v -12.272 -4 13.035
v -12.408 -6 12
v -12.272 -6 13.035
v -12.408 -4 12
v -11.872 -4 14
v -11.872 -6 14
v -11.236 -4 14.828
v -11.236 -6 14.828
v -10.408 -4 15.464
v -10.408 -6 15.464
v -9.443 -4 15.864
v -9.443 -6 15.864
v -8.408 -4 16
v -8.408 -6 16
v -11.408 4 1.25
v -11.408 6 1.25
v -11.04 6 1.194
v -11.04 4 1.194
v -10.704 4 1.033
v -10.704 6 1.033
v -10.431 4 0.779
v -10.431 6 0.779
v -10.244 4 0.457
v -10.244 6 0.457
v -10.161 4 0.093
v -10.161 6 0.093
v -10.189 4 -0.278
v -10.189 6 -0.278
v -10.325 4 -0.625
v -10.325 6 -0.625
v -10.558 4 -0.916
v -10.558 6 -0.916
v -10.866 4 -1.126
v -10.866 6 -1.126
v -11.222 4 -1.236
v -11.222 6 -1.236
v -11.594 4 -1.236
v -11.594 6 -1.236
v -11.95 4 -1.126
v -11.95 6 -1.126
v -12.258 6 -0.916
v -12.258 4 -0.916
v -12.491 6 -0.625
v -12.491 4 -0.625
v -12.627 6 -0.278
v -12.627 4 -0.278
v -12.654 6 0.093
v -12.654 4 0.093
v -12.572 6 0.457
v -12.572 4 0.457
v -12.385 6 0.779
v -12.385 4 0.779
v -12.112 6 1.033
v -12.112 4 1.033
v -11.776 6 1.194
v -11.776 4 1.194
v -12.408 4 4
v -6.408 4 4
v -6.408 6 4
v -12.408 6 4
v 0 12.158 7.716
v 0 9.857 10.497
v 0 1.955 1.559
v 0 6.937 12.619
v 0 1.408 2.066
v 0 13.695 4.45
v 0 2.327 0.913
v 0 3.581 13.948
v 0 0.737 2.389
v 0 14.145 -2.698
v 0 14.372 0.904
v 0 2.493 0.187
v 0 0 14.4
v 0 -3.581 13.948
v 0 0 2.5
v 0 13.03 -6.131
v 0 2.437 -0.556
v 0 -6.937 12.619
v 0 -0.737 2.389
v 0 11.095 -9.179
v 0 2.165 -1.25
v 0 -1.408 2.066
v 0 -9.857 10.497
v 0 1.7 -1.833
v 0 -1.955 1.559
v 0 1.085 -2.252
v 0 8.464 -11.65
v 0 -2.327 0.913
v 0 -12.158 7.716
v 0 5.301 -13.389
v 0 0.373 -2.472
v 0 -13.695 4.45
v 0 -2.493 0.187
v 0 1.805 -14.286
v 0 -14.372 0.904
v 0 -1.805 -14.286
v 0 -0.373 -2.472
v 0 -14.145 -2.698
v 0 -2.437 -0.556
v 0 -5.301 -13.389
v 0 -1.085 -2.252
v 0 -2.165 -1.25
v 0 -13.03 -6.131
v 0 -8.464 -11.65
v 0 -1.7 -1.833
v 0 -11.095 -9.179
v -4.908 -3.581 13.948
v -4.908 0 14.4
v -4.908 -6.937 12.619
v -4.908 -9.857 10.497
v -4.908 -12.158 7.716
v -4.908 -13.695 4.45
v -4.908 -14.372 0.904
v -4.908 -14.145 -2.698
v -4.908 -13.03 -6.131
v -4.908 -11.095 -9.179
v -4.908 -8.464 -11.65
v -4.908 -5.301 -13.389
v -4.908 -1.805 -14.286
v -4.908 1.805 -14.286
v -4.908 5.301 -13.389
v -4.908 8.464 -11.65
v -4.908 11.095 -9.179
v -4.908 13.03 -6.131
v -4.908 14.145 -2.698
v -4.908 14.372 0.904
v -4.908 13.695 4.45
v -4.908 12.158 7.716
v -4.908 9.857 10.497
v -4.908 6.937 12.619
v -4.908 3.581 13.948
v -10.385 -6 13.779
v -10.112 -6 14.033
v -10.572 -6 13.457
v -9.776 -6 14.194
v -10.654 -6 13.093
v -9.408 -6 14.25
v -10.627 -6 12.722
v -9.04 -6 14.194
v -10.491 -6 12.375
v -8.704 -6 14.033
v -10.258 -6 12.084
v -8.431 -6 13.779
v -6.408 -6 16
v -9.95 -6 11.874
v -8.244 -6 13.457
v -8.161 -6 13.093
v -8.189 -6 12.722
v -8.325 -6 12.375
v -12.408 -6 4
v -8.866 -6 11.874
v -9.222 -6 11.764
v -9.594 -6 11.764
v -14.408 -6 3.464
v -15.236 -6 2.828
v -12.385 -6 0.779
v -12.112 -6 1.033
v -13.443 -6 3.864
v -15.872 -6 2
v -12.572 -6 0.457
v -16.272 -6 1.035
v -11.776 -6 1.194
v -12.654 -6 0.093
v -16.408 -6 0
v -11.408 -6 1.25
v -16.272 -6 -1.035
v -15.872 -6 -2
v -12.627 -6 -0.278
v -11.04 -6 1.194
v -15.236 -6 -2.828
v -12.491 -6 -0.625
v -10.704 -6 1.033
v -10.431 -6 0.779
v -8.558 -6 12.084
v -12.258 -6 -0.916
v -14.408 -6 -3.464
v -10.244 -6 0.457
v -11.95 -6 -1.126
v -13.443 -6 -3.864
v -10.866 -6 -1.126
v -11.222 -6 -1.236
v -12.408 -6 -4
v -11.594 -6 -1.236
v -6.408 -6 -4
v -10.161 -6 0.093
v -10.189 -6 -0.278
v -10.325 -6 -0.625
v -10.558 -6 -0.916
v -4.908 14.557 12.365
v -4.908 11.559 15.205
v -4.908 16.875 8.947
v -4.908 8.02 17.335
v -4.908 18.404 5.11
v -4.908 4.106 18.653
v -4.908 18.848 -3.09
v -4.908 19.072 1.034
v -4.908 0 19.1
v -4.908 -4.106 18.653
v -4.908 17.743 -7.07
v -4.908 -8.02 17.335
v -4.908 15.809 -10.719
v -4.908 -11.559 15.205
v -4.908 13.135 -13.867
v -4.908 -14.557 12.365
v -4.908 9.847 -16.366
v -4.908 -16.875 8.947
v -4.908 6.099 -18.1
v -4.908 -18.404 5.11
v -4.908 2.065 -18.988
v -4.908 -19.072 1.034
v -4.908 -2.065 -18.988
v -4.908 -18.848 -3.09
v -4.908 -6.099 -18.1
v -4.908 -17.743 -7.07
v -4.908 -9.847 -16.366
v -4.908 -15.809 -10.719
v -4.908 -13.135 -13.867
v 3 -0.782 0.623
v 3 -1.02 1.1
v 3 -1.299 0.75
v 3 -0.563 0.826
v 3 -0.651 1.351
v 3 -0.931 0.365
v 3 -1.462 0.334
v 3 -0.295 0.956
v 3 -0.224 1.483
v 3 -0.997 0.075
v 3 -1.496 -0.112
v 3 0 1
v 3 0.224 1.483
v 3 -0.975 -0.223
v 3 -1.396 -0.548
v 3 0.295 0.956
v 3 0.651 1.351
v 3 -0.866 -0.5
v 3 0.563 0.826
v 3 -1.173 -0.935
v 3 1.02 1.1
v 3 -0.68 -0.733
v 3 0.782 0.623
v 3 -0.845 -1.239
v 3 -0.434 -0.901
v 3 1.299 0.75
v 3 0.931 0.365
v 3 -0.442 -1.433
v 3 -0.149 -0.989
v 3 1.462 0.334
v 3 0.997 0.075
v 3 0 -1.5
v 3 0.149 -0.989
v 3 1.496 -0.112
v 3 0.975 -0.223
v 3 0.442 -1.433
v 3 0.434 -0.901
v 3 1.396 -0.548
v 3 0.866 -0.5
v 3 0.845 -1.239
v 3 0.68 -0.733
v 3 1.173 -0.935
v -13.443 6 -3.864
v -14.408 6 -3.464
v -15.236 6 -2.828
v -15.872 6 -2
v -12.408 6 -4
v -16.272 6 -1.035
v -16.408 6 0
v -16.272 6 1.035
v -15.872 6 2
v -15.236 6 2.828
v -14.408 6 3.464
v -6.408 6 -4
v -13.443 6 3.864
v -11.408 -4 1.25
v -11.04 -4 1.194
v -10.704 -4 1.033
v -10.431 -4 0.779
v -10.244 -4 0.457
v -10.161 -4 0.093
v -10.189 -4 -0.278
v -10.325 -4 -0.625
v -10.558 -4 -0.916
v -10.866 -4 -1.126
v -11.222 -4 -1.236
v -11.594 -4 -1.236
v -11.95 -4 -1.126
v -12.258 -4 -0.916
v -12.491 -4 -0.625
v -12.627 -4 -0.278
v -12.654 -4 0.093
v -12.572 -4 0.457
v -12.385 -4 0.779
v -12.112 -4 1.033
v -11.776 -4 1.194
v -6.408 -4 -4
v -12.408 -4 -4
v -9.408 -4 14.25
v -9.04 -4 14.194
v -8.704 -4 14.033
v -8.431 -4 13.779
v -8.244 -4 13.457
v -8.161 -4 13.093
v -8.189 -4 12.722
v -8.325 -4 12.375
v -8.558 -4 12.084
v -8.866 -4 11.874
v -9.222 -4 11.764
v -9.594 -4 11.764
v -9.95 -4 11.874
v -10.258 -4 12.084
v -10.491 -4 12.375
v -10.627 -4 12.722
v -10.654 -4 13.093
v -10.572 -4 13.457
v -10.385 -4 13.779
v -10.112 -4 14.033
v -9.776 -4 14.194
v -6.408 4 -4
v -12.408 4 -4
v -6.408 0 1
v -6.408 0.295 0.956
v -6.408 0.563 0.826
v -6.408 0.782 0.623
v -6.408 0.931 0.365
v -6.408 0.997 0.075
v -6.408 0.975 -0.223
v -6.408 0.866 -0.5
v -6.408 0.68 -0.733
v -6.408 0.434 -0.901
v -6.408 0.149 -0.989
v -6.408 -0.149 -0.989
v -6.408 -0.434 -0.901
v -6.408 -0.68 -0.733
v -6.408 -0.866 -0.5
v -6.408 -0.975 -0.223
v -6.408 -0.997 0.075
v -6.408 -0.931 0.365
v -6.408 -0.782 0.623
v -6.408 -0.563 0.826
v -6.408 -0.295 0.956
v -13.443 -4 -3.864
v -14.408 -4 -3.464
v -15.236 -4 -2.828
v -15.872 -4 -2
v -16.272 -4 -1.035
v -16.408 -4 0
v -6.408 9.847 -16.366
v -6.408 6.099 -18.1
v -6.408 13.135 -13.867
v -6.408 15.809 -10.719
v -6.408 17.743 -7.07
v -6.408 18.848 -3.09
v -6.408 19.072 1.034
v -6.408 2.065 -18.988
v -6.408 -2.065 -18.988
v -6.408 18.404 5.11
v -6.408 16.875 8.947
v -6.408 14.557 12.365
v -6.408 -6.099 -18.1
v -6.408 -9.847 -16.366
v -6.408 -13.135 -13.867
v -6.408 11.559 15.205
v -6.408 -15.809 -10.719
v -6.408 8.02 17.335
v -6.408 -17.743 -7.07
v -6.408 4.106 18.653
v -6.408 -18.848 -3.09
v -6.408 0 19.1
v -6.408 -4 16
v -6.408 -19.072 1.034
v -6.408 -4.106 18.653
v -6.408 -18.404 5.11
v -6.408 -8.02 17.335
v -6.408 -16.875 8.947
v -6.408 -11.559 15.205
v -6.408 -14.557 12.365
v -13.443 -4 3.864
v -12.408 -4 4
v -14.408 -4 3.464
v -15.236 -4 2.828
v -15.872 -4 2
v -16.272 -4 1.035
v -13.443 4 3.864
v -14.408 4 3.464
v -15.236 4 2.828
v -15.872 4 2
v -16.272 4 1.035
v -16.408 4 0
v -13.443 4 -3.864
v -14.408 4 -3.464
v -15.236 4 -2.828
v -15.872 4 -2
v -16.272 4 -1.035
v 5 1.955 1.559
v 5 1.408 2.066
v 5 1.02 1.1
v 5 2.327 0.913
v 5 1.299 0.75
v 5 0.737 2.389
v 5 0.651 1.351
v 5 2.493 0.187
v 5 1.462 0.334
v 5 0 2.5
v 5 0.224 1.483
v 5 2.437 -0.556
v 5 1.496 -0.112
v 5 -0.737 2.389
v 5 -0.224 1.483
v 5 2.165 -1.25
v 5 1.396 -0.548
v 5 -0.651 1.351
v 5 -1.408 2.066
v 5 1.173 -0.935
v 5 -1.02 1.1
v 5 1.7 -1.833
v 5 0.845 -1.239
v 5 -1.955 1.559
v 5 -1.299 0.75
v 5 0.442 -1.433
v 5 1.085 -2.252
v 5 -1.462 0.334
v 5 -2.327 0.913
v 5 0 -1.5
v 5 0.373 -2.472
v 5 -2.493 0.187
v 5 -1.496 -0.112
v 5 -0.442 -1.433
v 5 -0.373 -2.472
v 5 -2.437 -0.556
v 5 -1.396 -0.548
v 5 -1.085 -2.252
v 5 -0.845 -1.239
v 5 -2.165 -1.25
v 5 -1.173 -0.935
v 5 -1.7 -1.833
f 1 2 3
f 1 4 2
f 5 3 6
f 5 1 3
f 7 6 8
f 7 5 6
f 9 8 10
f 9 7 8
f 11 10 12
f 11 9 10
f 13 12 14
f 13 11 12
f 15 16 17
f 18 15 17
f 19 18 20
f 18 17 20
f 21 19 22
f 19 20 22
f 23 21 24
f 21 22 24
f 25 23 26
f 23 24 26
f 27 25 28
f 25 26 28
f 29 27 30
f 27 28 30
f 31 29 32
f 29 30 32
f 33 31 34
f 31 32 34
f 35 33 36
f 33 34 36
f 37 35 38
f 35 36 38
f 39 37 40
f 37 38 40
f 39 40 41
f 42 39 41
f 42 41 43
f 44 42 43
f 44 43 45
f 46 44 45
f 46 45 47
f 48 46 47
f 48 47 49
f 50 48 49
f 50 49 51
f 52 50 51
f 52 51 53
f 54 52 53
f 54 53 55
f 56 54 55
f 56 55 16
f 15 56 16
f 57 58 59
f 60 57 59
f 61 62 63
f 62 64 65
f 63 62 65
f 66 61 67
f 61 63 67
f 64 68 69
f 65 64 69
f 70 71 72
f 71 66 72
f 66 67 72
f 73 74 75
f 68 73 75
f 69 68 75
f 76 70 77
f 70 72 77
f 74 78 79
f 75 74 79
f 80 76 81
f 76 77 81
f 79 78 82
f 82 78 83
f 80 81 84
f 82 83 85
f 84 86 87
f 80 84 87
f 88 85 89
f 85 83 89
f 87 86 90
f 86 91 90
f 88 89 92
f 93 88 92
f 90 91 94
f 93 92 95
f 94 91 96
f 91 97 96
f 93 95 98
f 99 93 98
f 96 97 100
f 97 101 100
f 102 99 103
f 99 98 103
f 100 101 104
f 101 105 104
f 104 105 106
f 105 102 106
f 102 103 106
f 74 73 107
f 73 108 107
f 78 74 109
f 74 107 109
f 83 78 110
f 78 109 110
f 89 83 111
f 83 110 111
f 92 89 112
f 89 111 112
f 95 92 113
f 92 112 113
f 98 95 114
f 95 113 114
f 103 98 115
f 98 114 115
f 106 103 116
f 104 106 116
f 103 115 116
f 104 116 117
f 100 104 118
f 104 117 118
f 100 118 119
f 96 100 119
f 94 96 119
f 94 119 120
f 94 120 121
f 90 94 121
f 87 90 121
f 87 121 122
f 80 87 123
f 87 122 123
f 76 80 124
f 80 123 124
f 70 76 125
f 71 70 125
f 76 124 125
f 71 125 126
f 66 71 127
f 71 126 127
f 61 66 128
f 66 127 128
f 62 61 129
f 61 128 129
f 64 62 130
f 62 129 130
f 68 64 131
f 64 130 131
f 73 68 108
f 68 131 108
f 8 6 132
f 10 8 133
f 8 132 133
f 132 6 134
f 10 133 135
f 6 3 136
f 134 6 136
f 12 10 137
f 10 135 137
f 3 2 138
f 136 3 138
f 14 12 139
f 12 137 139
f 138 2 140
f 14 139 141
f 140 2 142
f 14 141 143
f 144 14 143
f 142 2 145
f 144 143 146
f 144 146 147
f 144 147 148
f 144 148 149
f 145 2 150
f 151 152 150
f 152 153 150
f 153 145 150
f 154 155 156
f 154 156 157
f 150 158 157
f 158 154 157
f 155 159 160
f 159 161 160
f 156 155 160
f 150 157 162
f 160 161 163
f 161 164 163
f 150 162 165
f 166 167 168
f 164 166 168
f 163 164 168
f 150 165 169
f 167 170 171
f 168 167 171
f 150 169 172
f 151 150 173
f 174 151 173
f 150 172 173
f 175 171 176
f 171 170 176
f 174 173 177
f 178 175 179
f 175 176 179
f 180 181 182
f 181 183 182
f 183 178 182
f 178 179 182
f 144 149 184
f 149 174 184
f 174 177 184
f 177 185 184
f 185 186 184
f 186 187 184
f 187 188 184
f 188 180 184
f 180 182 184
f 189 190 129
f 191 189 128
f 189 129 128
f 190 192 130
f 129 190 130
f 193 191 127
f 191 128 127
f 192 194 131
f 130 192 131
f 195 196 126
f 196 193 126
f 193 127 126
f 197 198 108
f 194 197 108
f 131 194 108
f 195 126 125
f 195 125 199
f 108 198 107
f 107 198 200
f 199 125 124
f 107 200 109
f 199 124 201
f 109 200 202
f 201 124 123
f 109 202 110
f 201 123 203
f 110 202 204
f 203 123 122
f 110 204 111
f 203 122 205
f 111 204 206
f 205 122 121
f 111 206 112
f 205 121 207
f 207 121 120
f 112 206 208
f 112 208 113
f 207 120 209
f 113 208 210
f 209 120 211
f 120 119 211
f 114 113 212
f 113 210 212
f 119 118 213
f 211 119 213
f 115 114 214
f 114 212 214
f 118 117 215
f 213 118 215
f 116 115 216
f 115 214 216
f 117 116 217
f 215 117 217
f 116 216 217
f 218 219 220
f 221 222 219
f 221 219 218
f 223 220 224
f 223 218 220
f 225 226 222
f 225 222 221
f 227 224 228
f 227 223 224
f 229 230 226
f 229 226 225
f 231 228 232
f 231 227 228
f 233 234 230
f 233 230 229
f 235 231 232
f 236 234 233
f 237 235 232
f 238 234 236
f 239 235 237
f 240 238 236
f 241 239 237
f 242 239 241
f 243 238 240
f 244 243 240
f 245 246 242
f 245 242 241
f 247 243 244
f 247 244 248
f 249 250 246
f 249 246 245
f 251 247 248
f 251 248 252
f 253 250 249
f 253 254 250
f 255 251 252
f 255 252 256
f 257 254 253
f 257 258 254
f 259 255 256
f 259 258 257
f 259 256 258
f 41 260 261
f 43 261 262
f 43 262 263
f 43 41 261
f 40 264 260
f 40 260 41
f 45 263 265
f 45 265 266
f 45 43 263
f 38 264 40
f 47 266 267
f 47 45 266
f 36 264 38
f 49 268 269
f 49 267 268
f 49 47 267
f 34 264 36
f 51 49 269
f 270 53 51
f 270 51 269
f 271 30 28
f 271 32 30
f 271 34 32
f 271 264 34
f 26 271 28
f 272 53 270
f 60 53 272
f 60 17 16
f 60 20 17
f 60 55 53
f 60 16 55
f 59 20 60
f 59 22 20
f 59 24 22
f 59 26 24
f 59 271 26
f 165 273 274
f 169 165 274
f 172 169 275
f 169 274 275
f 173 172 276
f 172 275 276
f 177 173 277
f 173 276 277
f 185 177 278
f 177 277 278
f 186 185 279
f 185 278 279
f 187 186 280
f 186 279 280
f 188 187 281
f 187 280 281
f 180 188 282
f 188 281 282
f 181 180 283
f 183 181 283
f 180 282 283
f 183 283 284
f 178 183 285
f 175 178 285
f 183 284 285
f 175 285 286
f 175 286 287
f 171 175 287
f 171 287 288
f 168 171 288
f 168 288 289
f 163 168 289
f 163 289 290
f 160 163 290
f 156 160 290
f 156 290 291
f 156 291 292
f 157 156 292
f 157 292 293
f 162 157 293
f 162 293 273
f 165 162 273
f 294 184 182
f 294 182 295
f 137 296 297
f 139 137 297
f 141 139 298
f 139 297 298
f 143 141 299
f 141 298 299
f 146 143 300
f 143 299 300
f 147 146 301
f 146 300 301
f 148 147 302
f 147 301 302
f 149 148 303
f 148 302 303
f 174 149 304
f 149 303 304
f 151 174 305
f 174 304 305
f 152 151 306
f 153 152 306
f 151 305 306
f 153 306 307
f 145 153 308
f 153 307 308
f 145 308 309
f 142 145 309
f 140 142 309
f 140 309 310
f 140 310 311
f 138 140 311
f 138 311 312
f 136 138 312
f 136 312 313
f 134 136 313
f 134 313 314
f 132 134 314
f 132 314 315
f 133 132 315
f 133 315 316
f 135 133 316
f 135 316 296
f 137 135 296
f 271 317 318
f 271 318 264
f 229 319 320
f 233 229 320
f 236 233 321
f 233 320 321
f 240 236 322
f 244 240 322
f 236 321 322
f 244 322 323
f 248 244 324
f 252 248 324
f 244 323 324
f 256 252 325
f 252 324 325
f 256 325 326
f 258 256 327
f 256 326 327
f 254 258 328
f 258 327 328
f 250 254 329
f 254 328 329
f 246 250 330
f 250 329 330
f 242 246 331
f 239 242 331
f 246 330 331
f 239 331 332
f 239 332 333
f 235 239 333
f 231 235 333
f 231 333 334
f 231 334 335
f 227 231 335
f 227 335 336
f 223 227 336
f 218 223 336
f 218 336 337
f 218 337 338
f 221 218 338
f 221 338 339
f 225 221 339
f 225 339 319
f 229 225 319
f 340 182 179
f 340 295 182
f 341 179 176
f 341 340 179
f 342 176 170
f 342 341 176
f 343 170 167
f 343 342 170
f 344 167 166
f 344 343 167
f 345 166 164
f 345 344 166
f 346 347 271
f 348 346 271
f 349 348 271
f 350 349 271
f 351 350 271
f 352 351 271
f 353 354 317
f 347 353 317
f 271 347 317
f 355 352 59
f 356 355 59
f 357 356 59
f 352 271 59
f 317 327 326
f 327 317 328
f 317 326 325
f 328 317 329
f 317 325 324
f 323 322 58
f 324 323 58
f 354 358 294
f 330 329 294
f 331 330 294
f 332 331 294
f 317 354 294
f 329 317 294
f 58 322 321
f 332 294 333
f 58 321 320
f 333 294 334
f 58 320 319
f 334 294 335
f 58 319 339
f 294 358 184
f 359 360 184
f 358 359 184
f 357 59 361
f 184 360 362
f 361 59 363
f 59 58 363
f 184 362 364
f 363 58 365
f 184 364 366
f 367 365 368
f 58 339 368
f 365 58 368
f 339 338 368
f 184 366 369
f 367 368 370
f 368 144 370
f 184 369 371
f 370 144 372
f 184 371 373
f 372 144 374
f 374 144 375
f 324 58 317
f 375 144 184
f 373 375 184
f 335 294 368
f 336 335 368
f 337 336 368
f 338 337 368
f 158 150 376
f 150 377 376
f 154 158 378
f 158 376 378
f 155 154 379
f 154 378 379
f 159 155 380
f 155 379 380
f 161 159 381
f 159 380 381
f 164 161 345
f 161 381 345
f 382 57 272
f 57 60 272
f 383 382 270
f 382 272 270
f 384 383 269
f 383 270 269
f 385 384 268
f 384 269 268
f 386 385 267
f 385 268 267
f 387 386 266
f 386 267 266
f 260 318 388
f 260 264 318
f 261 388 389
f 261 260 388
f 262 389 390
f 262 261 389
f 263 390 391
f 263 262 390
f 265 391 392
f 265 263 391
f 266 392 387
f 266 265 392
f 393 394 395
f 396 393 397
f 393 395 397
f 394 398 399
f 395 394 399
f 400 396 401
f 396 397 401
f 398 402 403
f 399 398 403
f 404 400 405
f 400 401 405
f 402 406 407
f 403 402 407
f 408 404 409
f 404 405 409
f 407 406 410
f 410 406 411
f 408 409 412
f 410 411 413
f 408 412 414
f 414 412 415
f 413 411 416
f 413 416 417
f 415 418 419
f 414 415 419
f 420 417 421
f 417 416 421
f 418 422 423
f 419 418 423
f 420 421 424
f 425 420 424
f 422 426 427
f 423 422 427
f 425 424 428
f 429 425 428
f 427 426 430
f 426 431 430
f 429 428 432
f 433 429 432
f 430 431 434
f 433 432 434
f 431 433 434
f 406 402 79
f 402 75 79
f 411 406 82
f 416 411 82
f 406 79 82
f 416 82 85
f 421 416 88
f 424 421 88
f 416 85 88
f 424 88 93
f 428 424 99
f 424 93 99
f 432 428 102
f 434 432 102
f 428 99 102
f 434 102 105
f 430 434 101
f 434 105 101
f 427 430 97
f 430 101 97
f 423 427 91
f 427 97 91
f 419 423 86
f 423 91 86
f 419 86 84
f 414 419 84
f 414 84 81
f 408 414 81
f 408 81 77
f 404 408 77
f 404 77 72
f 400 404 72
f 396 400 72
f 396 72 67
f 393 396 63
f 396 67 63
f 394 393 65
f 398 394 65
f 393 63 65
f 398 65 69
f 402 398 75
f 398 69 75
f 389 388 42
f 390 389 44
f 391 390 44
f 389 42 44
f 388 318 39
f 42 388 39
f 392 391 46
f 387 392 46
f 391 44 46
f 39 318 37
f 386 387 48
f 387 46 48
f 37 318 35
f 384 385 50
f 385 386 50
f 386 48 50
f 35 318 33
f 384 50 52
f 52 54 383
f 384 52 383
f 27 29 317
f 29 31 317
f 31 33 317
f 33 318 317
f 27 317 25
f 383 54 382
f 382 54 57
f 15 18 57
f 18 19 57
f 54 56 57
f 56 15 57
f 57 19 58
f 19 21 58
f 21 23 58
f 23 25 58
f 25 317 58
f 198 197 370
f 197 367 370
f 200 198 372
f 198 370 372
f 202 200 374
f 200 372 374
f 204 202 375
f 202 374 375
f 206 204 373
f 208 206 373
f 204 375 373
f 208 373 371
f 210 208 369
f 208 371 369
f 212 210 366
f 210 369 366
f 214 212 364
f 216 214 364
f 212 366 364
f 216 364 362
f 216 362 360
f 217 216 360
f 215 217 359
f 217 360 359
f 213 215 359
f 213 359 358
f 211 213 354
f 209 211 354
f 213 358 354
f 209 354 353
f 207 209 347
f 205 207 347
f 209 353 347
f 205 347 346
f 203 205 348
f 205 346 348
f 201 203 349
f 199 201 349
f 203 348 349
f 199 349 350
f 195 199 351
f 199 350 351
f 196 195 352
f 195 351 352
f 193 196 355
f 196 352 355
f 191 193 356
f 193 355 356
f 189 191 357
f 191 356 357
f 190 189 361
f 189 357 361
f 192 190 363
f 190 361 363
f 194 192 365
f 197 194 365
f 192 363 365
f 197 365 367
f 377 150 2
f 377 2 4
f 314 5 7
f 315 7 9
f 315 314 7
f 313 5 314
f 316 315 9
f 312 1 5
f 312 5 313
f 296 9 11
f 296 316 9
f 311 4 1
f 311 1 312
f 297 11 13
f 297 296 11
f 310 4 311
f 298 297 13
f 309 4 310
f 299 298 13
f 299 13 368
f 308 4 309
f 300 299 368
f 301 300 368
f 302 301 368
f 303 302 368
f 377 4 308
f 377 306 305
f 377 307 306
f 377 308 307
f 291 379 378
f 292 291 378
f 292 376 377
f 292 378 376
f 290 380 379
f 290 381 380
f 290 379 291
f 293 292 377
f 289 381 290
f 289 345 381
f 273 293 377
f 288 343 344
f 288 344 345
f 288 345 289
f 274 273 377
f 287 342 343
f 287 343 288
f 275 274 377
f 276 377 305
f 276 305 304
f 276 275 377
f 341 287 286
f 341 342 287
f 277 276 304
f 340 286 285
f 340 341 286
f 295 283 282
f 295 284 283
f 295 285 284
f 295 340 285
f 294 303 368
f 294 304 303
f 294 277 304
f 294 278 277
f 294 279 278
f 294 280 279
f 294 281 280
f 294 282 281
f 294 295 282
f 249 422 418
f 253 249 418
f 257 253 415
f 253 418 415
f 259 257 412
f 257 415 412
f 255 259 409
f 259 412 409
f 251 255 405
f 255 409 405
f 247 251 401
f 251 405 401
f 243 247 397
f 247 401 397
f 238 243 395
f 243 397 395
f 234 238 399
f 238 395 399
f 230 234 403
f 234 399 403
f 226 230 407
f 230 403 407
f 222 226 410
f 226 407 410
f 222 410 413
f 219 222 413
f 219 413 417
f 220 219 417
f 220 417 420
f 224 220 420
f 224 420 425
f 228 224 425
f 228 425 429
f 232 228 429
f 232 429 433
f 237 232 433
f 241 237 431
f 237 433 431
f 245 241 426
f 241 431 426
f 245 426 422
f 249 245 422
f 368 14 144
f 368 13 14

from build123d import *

# Parameters (mm, degrees)
SKETCH2_R           = 1
CUT_EXTRUDE1_DEPTH  = 30.321700517
SKETCH3_R           = 1.5
CUT_EXTRUDE2_DEPTH  = 2
SKETCH4_W           = 8
SKETCH4_H           = 2
BOSS_EXTRUDE1_DEPTH = 10
SKETCH6_R           = 1.25
CUT_EXTRUDE4_DEPTH  = 20
FILLET1_R           = 4
SKETCH7_W           = 6
SKETCH7_H           = 2
BOSS_EXTRUDE2_DEPTH = 12
SKETCH8_R           = 1.25
CUT_EXTRUDE5_DEPTH  = 12
FILLET2_R           = 4


with BuildPart() as part:
    # Sketch1 → Revolve1 (revolve)
    with BuildSketch(Plane(origin=(0, 0, 0), x_dir=(1, 0, 0), z_dir=(0, 1, 0)), mode=Mode.PRIVATE) as revolve1_sk:
        Polygon((0, 2.5), (0, 14.4), (-4.907984975, 14.4), (-4.907984975, 19.1), (-6.407984975, 19.1), (-6.407984975, 0), (0, 0), (5, 0), (5, 2.5), align=None)
    revolve(revolve1_sk.sketch.rotate(Axis((-25.527114743, 0, 0), (1, 0, 0)), 180), axis=Axis((-25.527114743, 0, 0), (1, 0, 0)))

    # Sketch2 → Cut-Extrude1 (cut, through all)
    with BuildSketch(Plane.ZY.offset(6.407984975)):
        Circle(SKETCH2_R)
    extrude(amount=-CUT_EXTRUDE1_DEPTH, mode=Mode.SUBTRACT)

    # Sketch3 → Cut-Extrude2 (cut)
    with BuildSketch(Plane(origin=(5, 0, 0), x_dir=(0, 0, -1), z_dir=(1, 0, 0))):
        Circle(SKETCH3_R)
    extrude(amount=-CUT_EXTRUDE2_DEPTH, mode=Mode.SUBTRACT)

    # Sketch4 → Boss-Extrude1 (add)
    with BuildSketch(Plane.ZY.offset(6.407984975)):
        with Locations((0, 5)):
            Rectangle(SKETCH4_W, SKETCH4_H)
        with Locations((0, -5)):
            Rectangle(SKETCH4_W, SKETCH4_H)
    extrude(amount=BOSS_EXTRUDE1_DEPTH)

    # Sketch6 → Cut-Extrude4 (cut)
    with BuildSketch(Plane(origin=(0, 6, 0), x_dir=(1, 0, 0), z_dir=(0, 1, 0))):
        with Locations(Location((-11.407984975, 0, 0), (0, 0, 270))):
            Circle(SKETCH6_R)
    extrude(amount=-CUT_EXTRUDE4_DEPTH, mode=Mode.SUBTRACT)

    # Fillet1
    fillet1_edges = [part.edges().sort_by_distance(p)[0] for p in [
        (-16.407984975, -5, 4),
        (-16.407984975, -5, -4),
        (-16.407984975, 5, 4),
        (-16.407984975, 5, -4),
    ]]
    fillet(fillet1_edges, radius=FILLET1_R - 0.0001)  # a hair under: the kernel refuses the full size

    # Sketch7 → Boss-Extrude2 (add)
    with BuildSketch(Plane.XY.offset(4)):
        with Locations((-9.407984975, -5)):
            Rectangle(SKETCH7_W, SKETCH7_H)
    extrude(amount=BOSS_EXTRUDE2_DEPTH)

    # Sketch8 → Cut-Extrude5 (cut)
    with BuildSketch(Plane(origin=(0, -4, 0), x_dir=(1, 0, 0), z_dir=(0, 1, 0))):
        with Locations(Location((-9.407984975, -13, 0), (0, 0, 270))):
            Circle(SKETCH8_R)
    extrude(amount=-CUT_EXTRUDE5_DEPTH, mode=Mode.SUBTRACT)

    # Fillet2
    fillet2_edges = [part.edges().sort_by_distance(p)[0] for p in [
        (-12.407984975, -5, 16),
    ]]
    fillet(fillet2_edges, radius=FILLET2_R)


solid = part.part
